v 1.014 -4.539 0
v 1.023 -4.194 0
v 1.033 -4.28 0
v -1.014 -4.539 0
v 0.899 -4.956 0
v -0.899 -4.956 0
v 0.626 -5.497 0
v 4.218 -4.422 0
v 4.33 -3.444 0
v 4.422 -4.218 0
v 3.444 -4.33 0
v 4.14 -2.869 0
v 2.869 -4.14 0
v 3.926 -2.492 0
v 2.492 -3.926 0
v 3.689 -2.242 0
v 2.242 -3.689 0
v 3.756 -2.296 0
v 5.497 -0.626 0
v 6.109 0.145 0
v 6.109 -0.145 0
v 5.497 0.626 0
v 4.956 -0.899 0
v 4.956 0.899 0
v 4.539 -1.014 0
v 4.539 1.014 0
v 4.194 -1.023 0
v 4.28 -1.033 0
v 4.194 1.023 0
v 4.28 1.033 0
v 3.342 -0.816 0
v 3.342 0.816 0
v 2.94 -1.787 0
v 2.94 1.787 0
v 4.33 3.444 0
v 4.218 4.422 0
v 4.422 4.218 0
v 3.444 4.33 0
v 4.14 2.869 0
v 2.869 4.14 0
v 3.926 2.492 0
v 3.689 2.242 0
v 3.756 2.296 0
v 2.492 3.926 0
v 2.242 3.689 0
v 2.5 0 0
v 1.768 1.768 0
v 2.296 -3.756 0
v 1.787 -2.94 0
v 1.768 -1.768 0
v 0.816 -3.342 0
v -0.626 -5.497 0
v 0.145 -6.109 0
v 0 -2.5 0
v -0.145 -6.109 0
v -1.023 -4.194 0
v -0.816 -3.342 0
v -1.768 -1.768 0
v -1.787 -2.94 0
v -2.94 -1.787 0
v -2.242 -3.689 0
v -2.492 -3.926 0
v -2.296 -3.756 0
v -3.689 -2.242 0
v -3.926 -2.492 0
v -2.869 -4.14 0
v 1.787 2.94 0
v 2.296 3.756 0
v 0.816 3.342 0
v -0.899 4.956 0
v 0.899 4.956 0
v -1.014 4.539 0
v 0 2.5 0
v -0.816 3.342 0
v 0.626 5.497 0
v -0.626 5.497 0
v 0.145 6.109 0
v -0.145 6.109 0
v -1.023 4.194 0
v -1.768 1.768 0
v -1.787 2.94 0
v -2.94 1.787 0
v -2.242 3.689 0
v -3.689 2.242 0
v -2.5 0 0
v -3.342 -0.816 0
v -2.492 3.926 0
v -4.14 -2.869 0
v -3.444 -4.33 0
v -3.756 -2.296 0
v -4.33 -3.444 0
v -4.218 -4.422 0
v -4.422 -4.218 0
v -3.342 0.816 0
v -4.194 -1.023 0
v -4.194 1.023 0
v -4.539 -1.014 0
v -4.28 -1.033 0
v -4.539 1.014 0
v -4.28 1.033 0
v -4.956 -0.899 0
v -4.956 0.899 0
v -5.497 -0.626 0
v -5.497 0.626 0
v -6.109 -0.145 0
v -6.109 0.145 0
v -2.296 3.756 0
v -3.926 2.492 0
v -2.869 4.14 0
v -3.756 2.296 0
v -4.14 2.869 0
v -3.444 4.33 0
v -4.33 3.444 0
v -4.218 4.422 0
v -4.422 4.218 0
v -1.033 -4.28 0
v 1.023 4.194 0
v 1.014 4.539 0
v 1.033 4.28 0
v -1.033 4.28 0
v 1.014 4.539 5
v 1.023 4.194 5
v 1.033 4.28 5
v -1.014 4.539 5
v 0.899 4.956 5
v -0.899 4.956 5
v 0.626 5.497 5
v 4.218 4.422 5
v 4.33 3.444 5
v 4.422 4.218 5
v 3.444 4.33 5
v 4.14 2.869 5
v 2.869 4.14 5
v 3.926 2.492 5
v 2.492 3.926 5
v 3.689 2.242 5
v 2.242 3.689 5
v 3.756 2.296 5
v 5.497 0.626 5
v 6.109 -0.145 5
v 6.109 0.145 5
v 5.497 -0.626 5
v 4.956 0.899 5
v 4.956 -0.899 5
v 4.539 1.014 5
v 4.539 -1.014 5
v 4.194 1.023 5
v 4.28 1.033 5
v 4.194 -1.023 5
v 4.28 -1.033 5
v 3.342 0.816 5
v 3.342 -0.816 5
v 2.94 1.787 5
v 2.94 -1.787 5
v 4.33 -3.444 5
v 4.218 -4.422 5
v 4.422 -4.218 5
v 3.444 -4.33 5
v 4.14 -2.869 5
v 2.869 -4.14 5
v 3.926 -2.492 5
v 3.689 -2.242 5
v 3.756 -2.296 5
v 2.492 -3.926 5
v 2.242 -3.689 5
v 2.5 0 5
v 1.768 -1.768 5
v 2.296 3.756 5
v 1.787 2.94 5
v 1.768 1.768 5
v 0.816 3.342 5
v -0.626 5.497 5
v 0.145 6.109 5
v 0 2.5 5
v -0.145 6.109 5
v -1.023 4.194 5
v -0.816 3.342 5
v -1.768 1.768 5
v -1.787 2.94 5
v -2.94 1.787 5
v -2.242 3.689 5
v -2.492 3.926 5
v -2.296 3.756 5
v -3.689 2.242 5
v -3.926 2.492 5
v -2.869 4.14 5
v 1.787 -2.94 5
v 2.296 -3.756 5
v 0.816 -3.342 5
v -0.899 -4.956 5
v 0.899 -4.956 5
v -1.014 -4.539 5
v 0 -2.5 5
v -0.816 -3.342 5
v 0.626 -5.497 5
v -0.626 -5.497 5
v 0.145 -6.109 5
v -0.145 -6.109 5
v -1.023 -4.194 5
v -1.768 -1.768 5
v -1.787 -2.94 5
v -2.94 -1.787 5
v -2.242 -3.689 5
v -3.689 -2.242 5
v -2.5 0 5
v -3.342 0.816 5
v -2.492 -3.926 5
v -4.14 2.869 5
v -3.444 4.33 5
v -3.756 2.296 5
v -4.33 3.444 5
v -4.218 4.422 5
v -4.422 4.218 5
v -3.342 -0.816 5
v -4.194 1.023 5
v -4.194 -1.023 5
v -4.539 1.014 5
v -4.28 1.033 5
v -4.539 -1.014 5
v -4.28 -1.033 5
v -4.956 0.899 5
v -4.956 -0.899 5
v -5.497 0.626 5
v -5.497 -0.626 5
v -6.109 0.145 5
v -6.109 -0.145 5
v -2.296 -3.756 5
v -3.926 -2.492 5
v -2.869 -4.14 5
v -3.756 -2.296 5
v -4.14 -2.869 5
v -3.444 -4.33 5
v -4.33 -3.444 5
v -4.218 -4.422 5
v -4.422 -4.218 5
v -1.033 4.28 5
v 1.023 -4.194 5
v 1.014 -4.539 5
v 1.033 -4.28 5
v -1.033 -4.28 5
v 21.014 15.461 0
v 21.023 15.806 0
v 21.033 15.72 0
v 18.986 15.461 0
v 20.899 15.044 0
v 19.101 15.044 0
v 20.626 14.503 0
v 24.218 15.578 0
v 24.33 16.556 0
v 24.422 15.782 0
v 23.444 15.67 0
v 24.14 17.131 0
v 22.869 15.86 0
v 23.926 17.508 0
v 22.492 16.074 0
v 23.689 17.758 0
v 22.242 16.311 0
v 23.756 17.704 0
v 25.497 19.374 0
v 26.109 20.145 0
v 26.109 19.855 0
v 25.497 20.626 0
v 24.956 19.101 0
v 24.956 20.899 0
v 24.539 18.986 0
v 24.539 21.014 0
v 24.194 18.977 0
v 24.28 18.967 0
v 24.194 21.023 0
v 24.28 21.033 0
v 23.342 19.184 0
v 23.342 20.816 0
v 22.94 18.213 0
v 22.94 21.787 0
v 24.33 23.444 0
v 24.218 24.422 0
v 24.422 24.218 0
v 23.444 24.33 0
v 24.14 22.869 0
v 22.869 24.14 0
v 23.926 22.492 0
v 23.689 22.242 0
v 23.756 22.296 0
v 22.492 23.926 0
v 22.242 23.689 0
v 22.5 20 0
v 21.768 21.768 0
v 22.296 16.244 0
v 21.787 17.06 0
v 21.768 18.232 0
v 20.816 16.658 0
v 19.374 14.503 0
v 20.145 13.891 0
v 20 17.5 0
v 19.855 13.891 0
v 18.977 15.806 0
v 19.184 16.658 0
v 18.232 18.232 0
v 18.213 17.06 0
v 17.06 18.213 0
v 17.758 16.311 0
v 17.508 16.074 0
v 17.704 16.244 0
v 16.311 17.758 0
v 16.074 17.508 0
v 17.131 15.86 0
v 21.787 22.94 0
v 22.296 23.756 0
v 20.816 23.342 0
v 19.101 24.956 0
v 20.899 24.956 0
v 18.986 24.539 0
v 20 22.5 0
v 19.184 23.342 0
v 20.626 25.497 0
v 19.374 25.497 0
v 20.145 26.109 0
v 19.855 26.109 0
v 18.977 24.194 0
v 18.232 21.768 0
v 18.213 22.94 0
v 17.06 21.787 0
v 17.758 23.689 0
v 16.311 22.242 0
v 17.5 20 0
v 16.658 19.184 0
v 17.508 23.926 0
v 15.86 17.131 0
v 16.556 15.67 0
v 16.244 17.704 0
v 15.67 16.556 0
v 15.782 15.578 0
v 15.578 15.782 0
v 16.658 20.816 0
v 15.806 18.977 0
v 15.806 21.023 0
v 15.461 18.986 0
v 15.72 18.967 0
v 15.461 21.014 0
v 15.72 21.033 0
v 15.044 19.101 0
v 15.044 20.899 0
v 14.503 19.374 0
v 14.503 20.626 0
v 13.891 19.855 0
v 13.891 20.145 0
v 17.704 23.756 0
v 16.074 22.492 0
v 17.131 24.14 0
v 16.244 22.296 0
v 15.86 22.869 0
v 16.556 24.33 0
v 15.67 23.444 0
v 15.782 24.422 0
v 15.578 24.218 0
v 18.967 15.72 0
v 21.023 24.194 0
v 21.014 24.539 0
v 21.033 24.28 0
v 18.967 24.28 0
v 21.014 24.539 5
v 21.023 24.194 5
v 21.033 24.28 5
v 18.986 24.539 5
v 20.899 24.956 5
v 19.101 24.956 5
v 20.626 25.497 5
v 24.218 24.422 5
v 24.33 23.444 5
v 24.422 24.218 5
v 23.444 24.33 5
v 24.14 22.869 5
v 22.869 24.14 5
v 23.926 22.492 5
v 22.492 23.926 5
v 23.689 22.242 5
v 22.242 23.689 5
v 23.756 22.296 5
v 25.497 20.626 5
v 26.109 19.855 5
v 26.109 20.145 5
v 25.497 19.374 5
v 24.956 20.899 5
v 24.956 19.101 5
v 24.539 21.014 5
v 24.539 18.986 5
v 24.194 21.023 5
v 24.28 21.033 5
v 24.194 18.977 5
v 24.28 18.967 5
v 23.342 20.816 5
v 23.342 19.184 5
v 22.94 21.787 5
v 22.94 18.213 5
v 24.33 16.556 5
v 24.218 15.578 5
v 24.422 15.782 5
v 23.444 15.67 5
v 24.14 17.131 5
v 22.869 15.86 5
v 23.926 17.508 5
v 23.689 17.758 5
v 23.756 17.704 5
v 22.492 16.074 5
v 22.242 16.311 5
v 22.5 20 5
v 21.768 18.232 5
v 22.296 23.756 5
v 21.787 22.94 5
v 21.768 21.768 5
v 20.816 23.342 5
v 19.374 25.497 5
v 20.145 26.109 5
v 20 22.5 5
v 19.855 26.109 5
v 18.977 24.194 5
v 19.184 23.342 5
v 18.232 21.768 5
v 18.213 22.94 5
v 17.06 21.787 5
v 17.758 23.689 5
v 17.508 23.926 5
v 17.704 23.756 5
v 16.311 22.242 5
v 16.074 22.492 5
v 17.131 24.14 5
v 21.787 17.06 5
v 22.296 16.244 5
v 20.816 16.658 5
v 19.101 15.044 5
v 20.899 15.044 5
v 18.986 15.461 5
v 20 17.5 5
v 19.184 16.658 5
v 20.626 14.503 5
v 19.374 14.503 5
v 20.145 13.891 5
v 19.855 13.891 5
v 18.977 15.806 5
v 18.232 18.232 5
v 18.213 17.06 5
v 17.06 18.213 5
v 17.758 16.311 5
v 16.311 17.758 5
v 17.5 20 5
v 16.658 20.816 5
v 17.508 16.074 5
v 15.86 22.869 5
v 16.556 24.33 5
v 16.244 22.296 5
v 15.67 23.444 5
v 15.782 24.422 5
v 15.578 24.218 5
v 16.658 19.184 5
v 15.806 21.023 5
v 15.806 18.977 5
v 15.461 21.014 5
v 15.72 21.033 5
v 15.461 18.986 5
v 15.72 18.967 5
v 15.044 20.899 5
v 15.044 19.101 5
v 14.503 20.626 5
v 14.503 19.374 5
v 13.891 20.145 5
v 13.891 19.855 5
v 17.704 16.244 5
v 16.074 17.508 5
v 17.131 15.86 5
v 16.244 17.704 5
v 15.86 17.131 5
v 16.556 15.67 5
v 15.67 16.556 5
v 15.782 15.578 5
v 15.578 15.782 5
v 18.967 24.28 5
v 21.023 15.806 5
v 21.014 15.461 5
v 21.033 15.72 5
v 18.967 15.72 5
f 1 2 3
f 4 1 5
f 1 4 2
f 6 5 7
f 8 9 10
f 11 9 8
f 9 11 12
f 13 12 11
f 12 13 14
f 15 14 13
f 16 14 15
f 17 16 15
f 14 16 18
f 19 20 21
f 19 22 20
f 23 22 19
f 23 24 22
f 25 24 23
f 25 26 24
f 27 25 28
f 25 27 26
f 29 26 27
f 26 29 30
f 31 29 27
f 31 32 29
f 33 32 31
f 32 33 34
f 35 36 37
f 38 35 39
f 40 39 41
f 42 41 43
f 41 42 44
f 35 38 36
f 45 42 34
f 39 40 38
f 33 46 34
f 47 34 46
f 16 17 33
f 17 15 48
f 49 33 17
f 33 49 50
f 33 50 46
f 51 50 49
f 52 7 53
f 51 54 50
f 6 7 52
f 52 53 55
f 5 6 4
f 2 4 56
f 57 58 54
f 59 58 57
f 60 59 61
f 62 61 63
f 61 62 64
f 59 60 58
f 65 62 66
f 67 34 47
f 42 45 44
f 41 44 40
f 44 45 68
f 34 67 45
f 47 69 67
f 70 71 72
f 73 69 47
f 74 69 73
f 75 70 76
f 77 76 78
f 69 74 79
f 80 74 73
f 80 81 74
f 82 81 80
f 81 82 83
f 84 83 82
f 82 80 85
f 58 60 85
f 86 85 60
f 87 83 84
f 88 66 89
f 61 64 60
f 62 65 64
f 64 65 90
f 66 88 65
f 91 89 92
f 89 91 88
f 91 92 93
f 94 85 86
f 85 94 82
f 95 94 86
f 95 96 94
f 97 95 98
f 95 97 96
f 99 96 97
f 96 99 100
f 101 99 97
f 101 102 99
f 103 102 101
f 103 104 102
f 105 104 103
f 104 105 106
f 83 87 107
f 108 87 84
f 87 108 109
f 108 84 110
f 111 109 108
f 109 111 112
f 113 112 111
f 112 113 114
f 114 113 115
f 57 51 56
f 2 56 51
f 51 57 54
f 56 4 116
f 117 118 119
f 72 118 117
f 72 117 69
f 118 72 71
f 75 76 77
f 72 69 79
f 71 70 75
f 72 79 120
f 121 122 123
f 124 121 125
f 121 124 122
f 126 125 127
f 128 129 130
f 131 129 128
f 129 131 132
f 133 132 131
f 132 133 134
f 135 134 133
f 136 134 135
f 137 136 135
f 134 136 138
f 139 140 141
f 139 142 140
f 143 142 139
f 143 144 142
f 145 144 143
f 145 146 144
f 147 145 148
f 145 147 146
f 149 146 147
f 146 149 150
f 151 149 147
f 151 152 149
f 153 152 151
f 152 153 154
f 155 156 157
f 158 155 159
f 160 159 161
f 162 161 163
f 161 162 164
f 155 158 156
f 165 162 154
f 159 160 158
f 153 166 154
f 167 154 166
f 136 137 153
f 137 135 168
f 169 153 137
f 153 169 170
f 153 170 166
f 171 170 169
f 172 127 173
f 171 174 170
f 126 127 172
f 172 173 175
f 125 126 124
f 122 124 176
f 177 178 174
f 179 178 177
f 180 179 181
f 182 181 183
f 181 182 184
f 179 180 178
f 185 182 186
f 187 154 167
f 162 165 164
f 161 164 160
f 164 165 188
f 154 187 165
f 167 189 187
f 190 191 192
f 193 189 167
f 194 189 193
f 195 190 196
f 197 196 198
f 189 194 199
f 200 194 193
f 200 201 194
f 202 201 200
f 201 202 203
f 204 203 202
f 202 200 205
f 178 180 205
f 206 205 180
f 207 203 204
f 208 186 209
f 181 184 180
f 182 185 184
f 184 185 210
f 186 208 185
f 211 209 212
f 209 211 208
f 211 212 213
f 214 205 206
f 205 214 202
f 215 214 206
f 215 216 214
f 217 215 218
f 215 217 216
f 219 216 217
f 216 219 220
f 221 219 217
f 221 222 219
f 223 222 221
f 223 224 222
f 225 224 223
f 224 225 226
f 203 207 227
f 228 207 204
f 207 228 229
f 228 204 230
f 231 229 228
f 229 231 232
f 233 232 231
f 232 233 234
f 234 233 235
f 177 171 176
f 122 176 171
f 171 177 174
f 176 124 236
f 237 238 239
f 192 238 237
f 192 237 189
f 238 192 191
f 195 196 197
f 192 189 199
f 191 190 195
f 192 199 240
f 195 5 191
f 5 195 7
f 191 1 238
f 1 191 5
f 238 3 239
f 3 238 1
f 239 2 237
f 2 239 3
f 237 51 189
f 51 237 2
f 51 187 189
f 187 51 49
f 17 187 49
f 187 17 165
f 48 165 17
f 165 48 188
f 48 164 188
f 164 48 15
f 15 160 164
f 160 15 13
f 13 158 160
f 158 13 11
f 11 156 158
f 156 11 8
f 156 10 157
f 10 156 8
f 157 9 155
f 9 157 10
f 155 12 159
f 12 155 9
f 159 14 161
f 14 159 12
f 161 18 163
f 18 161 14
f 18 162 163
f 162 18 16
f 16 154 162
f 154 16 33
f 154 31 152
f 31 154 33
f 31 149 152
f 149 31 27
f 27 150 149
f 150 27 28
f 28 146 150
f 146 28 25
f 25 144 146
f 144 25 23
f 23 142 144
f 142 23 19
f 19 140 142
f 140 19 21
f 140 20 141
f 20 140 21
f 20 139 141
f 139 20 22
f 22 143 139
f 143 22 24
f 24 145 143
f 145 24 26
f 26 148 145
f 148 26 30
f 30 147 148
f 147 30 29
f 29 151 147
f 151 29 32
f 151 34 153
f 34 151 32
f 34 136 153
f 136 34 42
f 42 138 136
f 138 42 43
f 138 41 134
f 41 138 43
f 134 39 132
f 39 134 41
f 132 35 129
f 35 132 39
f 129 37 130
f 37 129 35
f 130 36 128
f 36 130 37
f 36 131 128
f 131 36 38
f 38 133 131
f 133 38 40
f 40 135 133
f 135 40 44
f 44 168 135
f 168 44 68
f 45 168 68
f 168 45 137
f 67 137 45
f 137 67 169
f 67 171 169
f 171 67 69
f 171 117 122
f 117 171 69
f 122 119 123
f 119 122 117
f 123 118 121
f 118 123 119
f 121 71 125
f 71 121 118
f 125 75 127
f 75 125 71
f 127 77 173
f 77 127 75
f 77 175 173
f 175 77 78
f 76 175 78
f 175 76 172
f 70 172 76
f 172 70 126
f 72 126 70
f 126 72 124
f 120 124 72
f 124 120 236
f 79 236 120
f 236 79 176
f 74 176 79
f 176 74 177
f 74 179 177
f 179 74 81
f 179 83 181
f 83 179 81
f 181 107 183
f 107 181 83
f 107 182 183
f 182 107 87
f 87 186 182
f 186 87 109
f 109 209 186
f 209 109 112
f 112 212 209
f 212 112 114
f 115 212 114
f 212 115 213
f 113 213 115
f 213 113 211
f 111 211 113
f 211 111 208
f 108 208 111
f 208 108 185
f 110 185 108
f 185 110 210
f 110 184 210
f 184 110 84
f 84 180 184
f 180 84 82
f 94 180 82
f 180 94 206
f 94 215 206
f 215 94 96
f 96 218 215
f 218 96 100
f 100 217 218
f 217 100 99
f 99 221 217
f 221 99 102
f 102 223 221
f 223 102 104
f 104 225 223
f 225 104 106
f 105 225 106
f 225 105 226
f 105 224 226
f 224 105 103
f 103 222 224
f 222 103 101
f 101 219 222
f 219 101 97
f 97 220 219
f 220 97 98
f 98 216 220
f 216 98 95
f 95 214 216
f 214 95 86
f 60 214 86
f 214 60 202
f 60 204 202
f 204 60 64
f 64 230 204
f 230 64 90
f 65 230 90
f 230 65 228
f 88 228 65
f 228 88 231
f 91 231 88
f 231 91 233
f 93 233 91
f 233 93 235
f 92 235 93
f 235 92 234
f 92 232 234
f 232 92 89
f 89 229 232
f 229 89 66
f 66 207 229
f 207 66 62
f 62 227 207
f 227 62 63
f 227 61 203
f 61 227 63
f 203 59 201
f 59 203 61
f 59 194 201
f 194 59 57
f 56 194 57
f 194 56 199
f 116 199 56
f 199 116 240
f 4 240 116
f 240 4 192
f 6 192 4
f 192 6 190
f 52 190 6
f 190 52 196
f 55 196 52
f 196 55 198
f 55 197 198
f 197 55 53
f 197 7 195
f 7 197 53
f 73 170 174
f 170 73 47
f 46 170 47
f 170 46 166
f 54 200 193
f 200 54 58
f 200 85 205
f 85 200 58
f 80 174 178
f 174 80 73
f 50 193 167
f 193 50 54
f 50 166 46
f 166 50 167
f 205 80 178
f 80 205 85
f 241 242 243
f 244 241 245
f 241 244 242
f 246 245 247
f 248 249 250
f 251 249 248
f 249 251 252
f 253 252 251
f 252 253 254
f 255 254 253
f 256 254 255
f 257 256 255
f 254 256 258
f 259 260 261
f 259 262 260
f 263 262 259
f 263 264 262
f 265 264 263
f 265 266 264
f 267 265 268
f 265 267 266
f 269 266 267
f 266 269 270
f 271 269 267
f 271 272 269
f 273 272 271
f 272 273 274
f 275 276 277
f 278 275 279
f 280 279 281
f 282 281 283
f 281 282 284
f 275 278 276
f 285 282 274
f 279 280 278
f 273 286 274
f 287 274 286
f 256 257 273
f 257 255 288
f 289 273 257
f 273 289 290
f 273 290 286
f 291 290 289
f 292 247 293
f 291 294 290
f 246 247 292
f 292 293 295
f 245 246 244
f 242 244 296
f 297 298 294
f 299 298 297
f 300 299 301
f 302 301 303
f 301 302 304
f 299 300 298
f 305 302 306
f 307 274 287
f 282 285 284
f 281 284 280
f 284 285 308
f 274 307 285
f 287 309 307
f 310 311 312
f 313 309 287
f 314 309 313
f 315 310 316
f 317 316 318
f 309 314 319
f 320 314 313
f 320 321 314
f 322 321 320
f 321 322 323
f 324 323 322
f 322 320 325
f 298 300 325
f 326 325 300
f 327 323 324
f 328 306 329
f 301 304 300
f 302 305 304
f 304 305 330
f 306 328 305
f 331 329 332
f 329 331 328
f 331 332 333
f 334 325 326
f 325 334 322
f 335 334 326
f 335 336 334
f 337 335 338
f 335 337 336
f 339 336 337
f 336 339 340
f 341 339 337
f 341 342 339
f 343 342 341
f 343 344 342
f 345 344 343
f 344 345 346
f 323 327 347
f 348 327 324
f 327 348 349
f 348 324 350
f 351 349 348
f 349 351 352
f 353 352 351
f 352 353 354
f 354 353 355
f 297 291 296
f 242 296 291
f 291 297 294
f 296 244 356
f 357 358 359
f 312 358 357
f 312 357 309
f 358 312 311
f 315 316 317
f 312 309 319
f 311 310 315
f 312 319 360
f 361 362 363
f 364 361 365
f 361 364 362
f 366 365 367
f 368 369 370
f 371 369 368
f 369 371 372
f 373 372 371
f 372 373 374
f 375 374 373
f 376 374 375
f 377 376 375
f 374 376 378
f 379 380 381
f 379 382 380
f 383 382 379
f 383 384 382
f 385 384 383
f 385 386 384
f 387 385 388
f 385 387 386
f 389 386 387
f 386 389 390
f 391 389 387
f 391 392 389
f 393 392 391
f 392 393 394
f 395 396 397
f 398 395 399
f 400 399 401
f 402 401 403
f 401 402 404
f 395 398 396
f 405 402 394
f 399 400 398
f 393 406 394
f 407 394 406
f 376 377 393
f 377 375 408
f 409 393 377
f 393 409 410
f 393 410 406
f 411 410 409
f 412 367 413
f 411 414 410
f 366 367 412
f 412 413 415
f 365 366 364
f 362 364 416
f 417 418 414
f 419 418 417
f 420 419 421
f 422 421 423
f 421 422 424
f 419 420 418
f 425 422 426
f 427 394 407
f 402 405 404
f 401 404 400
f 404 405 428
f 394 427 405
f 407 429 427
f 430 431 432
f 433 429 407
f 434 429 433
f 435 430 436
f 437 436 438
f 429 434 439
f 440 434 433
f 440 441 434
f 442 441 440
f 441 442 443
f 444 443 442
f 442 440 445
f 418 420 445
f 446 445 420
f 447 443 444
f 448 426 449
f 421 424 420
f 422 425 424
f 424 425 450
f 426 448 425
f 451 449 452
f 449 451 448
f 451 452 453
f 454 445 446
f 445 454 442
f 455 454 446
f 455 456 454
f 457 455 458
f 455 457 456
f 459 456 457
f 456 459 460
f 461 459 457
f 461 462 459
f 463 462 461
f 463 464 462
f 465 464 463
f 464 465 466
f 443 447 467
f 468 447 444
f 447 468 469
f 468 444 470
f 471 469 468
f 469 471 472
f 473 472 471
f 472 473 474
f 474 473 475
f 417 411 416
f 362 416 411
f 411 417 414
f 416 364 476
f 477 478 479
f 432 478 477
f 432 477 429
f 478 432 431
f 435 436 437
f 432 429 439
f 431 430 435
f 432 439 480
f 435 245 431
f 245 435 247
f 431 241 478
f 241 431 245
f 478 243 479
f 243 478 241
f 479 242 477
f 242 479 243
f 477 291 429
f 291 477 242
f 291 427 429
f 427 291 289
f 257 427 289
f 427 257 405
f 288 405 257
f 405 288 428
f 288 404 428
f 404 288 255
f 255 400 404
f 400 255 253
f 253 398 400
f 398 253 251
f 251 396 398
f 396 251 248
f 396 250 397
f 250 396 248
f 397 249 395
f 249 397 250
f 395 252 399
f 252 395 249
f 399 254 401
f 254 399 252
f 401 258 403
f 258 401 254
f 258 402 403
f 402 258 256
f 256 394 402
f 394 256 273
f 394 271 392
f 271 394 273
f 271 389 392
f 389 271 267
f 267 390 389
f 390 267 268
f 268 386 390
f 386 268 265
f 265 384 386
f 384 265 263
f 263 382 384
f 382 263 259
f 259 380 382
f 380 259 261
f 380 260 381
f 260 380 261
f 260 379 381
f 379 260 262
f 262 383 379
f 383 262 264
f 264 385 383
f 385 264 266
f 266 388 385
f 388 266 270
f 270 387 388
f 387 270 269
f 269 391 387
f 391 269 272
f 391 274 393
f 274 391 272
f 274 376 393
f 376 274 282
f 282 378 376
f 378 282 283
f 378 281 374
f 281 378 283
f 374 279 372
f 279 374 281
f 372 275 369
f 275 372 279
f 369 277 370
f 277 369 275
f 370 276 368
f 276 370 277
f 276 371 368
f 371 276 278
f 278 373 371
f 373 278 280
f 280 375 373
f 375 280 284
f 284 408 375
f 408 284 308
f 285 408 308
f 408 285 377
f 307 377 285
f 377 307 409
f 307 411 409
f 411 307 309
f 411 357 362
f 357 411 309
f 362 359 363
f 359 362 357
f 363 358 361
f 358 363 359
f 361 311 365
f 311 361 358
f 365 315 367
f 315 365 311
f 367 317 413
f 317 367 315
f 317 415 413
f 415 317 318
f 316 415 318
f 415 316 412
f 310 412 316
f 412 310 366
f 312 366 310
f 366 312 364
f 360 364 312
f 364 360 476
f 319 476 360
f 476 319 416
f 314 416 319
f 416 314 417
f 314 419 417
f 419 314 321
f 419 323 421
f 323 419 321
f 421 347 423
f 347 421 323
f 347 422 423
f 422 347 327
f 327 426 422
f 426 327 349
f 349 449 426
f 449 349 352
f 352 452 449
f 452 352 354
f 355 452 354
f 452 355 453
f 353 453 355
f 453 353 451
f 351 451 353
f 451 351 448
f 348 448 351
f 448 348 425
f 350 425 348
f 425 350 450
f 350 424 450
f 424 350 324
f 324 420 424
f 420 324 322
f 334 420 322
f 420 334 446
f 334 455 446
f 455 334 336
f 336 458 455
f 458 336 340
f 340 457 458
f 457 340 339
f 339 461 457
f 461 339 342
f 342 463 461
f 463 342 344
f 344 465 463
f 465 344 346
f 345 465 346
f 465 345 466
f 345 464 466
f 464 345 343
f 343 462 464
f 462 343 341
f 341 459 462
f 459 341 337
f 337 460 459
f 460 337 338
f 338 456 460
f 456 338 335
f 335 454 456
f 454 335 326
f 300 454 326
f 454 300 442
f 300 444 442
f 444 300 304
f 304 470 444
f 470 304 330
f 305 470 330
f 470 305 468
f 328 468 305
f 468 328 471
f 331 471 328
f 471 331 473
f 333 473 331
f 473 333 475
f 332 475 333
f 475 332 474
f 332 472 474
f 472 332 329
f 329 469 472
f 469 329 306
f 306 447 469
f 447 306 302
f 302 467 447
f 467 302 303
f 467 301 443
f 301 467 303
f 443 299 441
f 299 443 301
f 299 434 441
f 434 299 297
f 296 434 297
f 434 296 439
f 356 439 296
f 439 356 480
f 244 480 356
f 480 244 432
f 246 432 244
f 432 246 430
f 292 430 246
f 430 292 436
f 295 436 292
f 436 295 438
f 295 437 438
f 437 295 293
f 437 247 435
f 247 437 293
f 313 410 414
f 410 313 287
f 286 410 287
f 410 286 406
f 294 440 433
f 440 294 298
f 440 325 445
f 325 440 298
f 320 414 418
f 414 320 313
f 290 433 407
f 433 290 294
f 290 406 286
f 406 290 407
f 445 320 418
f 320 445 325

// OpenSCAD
include <gears.scad>

gear(number_of_teeth=8, circular_pitch=220,
	hub_diameter=0, rim_width=0,
	hub_thickness=5,rim_thickness=5,gear_thickness=5);
				
translate([20, 20]){
	gear(number_of_teeth=8, circular_pitch=220,
		hub_diameter=0, rim_width=0,
		hub_thickness=5,rim_thickness=5,gear_thickness=5);
}
